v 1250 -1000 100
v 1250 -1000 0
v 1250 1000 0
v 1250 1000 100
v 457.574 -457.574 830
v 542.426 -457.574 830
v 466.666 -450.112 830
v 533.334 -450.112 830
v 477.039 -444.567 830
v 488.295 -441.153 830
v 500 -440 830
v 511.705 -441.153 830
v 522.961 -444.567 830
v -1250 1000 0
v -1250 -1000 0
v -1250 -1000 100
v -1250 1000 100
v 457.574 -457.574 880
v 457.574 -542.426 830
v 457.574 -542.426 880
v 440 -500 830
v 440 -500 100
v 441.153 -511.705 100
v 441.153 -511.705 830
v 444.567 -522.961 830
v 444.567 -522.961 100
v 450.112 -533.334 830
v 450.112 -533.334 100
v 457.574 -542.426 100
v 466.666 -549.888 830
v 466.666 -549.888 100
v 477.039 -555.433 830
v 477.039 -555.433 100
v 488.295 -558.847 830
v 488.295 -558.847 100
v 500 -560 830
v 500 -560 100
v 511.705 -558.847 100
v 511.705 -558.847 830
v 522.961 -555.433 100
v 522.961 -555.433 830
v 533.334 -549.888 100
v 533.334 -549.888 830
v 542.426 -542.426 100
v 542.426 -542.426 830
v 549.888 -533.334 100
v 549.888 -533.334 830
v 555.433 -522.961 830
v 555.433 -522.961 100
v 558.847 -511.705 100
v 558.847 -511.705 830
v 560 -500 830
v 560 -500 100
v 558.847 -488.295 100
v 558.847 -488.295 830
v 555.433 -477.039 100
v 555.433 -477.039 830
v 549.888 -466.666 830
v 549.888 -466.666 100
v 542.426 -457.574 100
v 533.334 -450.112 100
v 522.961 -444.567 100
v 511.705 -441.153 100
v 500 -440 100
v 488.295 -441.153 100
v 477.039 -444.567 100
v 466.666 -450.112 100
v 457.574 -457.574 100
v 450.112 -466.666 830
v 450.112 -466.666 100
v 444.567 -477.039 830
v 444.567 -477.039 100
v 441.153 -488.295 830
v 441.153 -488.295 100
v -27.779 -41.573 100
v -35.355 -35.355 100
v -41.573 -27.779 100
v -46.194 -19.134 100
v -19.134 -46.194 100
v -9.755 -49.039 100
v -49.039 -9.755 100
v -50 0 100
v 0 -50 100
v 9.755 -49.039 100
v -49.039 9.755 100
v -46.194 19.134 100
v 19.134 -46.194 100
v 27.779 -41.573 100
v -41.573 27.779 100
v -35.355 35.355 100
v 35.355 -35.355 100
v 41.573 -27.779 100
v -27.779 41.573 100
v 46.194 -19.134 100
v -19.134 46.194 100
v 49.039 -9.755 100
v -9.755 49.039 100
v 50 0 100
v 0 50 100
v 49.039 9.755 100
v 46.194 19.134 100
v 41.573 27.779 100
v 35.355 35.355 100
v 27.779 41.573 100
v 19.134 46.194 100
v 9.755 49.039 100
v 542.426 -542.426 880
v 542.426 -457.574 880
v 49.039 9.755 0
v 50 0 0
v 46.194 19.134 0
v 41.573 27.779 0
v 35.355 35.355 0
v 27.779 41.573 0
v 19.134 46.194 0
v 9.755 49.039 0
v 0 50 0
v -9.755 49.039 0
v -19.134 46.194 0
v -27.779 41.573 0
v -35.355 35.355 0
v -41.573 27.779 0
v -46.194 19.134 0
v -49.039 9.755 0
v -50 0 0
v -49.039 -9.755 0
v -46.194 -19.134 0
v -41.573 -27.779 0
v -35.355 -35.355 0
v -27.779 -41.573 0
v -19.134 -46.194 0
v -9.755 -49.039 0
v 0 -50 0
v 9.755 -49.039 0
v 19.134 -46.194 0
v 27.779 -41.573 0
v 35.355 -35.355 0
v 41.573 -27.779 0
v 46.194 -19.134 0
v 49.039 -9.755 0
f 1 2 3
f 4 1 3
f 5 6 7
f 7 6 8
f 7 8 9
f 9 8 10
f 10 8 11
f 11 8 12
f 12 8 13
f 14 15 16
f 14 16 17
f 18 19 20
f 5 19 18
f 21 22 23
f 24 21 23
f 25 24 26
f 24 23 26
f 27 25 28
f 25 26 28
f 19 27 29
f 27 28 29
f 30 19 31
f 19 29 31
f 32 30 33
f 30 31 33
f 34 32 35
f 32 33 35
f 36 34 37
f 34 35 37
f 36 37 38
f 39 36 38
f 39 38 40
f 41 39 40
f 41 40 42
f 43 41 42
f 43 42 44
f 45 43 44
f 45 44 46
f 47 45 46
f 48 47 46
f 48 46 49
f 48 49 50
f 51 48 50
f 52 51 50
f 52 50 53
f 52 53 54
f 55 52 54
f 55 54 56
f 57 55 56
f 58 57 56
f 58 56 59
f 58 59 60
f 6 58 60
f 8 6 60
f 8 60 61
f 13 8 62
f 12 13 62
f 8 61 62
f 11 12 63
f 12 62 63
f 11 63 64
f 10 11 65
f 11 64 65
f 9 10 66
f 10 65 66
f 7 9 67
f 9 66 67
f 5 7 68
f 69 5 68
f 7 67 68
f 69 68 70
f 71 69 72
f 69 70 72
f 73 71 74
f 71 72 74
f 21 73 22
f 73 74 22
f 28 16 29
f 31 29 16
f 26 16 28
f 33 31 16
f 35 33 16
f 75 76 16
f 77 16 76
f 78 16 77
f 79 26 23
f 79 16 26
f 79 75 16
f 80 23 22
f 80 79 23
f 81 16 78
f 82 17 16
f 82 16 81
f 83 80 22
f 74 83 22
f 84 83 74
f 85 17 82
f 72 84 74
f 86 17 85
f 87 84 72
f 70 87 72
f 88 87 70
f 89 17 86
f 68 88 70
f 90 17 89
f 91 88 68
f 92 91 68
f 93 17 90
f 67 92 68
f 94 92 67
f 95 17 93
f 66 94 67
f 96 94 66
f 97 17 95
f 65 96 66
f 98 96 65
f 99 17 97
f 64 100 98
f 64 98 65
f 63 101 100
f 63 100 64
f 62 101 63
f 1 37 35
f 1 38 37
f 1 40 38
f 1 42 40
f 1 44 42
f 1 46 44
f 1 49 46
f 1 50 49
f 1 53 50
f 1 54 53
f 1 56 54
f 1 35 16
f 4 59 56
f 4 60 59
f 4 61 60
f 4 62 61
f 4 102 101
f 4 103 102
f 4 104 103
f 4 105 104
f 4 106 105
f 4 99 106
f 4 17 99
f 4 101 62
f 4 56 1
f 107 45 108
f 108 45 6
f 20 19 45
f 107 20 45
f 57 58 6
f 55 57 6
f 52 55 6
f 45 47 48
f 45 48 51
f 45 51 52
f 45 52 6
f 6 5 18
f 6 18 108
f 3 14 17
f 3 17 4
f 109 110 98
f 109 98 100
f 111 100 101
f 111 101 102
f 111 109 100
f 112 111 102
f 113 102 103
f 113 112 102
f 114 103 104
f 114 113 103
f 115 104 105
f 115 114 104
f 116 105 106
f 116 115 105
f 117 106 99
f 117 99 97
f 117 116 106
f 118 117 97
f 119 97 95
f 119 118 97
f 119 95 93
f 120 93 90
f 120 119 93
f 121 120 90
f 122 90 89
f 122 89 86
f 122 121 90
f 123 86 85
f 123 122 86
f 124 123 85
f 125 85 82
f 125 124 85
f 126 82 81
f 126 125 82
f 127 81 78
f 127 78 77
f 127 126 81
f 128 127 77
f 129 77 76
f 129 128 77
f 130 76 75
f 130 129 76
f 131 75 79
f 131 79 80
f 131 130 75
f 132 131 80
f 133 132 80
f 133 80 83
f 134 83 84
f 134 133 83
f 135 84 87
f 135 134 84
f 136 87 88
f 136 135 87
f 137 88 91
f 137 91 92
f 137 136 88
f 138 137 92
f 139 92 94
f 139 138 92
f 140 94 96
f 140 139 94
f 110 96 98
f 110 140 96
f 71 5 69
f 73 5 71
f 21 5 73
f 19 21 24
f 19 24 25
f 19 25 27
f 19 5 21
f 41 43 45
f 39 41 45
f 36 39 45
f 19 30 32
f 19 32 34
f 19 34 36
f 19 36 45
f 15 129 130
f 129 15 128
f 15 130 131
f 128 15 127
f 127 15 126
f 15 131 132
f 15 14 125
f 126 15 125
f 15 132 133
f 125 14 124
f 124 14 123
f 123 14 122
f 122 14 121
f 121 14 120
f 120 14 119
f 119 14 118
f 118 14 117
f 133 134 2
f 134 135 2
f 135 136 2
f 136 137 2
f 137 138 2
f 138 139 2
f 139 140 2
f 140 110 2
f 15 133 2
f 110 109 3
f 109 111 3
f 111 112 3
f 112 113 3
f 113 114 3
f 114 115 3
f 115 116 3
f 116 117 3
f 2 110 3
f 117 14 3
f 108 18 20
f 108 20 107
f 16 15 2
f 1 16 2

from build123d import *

# Parameters (mm, degrees)
SKETCH_1_W      = 2500
SKETCH_1_H      = 2000
SKETCH_1_R      = 50
EXTRUDE_1_DEPTH = 100
SKETCH_2_R      = 60
EXTRUDE_2_DEPTH = 730
SKETCH_3_W      = 84.852813742
SKETCH_3_H      = 84.852813742
EXTRUDE_3_DEPTH = 50


with BuildPart() as part:
    # 草图1 → 凸台-拉伸1 (new body)
    with BuildSketch(Plane.XY):
        Rectangle(SKETCH_1_W, SKETCH_1_H)
        Circle(SKETCH_1_R, mode=Mode.SUBTRACT)
    extrude(amount=EXTRUDE_1_DEPTH)

    # 草图2 → 凸台-拉伸2 (add)
    with BuildSketch(Plane.XY.offset(100)):
        with Locations(Location((500, -500, 0), (0, 0, 180))):
            Circle(SKETCH_2_R)
    extrude(amount=EXTRUDE_2_DEPTH)

    # 草图3 → 凸台-拉伸3 (add)
    with BuildSketch(Plane.XY.offset(830)):
        with Locations((500, -500)):
            Rectangle(SKETCH_3_W, SKETCH_3_H)
    extrude(amount=EXTRUDE_3_DEPTH)


solid = part.part
